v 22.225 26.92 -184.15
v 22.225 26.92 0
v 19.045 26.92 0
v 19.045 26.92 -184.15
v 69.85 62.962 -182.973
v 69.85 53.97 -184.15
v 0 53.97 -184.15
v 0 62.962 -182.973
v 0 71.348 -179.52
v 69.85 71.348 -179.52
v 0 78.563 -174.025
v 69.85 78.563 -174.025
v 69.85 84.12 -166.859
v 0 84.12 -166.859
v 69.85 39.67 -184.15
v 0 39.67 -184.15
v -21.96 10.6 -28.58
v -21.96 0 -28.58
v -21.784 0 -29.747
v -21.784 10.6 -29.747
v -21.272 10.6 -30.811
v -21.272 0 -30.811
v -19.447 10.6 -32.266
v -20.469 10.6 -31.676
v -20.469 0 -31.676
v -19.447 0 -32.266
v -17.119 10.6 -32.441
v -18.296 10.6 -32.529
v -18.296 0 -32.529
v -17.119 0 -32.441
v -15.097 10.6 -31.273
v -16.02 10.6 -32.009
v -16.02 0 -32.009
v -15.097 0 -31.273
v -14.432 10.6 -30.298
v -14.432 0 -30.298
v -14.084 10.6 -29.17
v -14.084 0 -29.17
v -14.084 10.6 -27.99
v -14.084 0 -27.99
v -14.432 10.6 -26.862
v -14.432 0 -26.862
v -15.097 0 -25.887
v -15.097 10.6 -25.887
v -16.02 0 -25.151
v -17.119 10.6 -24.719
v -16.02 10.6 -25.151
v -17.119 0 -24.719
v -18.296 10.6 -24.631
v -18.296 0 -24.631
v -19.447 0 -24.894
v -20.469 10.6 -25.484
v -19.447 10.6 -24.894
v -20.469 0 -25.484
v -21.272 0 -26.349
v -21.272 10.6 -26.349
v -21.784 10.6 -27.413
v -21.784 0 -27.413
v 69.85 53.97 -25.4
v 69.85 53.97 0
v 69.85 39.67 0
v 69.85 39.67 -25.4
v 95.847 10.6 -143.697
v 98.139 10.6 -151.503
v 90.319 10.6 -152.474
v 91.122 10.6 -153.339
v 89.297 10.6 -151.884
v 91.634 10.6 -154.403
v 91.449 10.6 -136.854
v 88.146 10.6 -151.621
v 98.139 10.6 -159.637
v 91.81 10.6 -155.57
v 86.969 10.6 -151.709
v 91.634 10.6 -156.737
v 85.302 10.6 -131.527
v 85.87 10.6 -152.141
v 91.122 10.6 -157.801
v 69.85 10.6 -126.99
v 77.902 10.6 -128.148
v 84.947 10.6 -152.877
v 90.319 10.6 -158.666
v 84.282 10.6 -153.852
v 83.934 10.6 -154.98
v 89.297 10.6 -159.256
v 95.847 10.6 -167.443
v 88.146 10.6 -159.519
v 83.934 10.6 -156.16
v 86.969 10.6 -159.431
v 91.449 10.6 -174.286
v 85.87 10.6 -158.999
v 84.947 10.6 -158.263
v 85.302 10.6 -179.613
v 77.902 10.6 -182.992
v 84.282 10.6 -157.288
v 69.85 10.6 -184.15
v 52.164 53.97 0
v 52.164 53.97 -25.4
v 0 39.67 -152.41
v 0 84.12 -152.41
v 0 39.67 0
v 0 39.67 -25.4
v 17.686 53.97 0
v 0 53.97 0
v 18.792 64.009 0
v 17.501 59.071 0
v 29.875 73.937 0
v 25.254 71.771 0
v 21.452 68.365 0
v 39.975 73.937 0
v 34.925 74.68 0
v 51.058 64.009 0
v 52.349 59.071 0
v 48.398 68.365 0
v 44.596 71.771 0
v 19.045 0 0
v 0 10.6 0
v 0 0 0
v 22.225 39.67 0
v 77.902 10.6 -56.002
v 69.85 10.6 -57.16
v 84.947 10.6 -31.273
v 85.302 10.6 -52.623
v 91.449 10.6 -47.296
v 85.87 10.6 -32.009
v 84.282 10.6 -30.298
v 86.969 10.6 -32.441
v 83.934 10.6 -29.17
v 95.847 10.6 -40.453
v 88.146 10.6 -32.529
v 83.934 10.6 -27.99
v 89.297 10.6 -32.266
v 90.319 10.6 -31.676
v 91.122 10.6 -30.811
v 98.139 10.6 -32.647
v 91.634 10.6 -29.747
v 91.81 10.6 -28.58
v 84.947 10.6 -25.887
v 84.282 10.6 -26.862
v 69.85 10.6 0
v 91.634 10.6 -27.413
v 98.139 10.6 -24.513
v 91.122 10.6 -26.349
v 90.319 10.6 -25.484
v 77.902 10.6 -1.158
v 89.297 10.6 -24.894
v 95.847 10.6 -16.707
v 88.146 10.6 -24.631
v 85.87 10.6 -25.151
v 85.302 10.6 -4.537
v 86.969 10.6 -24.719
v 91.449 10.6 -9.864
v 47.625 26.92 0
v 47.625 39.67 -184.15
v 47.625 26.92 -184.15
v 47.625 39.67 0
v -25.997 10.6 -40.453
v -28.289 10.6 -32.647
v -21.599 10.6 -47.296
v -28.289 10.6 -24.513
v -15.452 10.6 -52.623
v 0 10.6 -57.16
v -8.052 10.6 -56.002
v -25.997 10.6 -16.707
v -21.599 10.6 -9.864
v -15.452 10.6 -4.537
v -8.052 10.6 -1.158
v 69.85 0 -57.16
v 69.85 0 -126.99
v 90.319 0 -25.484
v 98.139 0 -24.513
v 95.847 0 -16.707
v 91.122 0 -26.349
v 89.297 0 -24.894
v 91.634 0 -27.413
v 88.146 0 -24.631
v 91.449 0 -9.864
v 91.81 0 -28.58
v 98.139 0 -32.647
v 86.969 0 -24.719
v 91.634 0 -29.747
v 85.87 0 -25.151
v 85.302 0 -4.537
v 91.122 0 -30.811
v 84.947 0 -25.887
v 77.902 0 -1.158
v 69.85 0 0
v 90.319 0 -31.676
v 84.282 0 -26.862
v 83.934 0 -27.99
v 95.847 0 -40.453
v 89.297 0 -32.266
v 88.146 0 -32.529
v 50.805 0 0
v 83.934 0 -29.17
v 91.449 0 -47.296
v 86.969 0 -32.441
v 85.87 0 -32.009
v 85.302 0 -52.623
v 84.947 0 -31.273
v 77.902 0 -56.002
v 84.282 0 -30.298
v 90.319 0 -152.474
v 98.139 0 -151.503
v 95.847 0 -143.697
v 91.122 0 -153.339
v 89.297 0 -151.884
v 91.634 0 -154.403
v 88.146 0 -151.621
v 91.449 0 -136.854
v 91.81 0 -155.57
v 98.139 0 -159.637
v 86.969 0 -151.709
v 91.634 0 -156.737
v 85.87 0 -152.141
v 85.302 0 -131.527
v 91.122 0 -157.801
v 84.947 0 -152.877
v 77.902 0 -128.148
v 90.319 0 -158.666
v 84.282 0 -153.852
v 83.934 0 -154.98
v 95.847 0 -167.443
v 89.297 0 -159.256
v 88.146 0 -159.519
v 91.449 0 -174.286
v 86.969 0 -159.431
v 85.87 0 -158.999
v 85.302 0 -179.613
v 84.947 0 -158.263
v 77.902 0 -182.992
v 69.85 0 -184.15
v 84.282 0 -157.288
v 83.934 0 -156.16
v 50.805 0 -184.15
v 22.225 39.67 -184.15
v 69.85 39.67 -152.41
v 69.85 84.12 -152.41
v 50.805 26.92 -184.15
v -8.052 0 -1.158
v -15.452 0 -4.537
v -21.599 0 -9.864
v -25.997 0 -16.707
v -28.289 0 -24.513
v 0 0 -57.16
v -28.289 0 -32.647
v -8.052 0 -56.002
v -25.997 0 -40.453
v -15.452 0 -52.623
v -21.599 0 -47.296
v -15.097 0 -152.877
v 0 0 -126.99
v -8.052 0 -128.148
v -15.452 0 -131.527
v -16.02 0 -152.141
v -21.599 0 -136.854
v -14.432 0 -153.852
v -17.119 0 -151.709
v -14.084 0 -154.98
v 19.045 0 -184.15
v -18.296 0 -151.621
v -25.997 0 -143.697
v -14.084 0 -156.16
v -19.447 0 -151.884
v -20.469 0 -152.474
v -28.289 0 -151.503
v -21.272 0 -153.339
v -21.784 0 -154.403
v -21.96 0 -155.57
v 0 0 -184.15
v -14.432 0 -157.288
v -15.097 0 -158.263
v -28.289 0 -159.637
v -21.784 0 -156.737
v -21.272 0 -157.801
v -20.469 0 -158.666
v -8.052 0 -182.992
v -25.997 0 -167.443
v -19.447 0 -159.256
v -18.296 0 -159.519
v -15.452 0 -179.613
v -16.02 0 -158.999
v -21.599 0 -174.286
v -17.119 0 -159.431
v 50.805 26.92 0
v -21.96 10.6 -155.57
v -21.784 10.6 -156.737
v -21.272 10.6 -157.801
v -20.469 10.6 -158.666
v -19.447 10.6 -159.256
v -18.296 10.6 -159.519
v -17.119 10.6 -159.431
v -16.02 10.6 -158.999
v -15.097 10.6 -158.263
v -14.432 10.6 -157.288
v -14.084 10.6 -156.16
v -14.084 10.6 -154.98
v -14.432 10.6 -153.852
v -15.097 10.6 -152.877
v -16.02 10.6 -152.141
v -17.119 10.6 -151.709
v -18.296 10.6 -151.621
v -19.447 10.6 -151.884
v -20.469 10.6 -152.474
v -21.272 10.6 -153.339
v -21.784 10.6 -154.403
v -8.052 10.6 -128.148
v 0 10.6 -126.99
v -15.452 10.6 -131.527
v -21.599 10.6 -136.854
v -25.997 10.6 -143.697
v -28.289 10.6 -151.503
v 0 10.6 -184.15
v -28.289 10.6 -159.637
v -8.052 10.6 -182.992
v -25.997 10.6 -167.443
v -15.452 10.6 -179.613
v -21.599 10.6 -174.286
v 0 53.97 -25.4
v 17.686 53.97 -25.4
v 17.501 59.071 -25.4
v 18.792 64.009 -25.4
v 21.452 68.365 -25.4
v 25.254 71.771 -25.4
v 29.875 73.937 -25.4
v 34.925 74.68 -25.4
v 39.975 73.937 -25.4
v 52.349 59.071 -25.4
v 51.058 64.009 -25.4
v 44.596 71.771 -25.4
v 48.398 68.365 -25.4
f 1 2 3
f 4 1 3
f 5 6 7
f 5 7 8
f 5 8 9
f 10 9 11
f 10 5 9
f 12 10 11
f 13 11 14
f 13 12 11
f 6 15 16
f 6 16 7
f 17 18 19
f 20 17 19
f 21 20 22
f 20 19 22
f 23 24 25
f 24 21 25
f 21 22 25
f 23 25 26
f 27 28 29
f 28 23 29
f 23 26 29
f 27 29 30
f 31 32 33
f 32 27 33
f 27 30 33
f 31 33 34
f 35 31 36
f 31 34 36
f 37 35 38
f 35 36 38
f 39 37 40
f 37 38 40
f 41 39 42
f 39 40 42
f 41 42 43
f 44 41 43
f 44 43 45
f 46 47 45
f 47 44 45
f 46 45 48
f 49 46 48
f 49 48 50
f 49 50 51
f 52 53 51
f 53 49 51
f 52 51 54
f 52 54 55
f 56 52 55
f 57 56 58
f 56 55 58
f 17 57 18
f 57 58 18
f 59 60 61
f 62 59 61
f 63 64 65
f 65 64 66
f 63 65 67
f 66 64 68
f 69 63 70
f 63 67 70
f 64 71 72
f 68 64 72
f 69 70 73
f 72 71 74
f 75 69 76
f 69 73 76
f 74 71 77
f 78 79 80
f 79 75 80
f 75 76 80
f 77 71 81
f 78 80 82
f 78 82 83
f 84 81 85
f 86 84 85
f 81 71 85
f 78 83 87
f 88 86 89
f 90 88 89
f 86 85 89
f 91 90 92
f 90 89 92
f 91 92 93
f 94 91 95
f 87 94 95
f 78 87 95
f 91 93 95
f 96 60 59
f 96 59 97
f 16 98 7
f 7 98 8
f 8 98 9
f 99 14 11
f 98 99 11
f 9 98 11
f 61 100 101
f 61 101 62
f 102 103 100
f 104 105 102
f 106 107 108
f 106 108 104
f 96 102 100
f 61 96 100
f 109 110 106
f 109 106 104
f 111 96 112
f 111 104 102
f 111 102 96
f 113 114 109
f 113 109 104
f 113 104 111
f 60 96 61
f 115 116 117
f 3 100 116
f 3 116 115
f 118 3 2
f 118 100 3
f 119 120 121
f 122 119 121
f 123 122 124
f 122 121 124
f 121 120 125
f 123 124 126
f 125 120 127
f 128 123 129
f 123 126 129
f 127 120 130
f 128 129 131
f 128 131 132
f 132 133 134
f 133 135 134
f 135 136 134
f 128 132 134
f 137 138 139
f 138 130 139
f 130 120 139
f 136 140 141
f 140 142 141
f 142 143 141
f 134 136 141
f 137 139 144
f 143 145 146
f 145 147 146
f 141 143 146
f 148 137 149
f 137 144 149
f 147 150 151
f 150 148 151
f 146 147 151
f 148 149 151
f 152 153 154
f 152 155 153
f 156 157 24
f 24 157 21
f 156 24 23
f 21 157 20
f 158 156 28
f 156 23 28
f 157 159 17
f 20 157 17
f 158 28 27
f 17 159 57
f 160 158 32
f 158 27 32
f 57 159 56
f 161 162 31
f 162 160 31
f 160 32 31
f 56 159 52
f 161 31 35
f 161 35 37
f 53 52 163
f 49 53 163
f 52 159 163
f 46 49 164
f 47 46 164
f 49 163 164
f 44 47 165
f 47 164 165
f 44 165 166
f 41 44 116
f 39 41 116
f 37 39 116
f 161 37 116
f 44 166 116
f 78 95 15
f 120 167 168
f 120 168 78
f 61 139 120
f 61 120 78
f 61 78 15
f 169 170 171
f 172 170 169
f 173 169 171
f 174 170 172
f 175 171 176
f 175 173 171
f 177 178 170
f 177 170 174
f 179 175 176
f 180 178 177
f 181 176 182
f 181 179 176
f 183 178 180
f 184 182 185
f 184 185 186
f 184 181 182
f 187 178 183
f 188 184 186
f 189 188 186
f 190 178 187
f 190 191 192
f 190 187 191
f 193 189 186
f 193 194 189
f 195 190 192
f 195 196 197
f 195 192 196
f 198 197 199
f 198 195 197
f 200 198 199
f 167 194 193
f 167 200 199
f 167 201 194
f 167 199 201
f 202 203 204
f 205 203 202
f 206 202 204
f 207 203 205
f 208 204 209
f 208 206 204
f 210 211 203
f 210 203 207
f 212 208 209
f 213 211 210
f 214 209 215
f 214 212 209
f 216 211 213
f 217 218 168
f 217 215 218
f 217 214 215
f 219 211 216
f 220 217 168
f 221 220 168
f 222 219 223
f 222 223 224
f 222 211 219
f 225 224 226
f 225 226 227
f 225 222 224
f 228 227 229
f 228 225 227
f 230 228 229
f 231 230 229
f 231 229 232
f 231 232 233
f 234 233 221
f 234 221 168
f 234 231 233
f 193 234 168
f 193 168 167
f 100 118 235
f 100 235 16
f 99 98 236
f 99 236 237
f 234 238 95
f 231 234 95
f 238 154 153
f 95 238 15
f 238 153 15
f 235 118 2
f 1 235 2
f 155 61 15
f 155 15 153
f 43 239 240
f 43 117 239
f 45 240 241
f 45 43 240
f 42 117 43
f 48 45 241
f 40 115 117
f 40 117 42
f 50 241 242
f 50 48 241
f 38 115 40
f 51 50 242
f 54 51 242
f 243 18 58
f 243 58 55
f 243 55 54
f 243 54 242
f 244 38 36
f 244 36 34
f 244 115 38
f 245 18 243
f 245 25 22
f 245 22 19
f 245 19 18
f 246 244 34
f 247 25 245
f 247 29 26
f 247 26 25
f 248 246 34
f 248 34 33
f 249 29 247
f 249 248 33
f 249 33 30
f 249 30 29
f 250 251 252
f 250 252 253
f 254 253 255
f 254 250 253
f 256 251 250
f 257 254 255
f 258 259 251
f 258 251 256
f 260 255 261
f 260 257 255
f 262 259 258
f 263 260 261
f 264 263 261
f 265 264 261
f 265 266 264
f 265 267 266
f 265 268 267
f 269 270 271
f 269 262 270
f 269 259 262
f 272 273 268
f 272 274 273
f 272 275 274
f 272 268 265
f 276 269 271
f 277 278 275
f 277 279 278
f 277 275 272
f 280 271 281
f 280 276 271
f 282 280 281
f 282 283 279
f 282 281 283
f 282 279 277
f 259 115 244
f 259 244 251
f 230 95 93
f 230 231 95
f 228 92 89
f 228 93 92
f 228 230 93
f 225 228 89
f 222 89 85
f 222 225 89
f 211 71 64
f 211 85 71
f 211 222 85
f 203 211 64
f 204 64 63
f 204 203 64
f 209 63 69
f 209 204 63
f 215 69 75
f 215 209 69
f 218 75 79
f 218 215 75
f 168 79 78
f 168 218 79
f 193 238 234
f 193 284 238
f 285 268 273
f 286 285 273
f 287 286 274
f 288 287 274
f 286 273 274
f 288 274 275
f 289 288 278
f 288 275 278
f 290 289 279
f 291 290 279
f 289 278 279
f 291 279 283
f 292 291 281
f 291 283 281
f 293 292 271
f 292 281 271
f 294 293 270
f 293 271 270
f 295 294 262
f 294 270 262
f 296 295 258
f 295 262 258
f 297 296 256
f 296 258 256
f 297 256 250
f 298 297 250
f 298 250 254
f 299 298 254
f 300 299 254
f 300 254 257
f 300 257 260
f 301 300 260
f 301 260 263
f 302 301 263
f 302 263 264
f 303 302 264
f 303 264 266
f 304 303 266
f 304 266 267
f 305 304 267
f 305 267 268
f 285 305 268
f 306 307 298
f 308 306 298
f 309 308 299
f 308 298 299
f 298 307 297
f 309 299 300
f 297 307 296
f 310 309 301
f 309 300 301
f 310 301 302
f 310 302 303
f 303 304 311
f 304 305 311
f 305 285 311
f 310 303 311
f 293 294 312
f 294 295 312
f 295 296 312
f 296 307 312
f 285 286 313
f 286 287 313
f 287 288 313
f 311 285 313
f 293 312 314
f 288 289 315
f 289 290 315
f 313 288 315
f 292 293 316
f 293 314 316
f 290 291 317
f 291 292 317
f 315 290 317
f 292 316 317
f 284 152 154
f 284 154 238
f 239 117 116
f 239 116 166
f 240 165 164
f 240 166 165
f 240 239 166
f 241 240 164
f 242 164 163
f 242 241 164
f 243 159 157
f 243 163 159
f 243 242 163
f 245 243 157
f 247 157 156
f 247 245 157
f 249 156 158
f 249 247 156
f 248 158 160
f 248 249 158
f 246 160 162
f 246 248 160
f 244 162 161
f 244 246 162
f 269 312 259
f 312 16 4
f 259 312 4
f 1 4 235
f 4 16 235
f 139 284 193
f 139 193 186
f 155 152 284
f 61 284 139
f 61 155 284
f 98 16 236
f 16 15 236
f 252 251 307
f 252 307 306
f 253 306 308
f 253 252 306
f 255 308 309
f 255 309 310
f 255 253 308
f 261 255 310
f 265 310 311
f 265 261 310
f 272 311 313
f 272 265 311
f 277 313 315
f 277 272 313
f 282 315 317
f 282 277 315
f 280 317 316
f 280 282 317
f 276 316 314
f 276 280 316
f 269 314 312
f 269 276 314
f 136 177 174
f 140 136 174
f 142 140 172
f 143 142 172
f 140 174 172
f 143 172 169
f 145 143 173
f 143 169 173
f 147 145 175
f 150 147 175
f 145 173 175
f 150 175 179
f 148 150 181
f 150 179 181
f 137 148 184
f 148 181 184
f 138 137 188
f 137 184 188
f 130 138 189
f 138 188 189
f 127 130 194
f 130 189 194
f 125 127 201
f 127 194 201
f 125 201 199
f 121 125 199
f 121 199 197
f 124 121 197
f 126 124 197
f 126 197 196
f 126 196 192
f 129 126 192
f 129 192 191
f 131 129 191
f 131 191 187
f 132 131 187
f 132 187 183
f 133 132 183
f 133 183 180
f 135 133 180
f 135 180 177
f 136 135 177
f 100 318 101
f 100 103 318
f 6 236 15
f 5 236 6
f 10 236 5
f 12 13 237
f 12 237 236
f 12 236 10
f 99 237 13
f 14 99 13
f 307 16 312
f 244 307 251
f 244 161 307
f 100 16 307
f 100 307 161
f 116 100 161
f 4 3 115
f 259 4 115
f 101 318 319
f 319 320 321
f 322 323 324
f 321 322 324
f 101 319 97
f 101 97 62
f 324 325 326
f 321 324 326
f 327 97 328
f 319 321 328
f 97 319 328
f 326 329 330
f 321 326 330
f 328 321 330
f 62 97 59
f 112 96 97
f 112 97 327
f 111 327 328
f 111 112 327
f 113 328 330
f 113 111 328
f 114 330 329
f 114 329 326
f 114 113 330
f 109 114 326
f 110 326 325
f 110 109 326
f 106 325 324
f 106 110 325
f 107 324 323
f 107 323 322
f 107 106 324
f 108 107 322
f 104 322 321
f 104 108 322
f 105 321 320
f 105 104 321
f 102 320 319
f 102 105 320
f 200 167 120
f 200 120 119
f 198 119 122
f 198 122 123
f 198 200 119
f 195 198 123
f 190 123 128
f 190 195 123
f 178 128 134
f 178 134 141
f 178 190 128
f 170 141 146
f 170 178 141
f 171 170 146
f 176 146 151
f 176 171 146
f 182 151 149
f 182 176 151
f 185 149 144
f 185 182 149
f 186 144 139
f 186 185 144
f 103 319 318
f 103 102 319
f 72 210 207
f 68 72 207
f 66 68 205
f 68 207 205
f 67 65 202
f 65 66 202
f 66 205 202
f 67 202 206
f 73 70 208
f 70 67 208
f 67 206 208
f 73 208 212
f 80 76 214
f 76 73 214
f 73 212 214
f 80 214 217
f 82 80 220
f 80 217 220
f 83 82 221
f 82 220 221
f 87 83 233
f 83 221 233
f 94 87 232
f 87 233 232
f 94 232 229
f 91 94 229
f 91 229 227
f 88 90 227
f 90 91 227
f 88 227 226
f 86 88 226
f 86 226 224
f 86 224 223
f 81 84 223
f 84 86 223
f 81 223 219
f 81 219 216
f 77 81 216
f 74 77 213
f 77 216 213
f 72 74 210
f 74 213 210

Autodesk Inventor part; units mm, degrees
ref_plane "YZ Plane" through (0, 0, 0) normal (1, 0, 0) x (0, 1, 0)
sketch "Sketch1" plane through (0, 0, 0) normal (0, 0, 1) x (1, 0, 0)
  line L0 (0, 0) -> (69.85, 0)
  line L1 (69.85, 0) -> (69.85, 39.67)
  line L2 (69.85, 39.67) -> (0, 39.67)
  line L3 (0, 39.67) -> (0, 0)
  dimension "d0" = 69.85
  dimension "d1" = 39.67
extrude "Extrusion1" add sketch "Sketch1" against normal blind 184.15
sketch "Sketch2" plane through (69.85, 0, 0) normal (1, 0, 0) x (0, 0, -1)
  line L0 (184.15, 39.67) -> (184.15, 0) projected
  line L1 (184.15, 39.67) -> (152.41, 39.67)
  line L2 (0, 39.67) -> (184.15, 39.67) projected
  line L3 (152.41, 39.67) -> (152.41, 84.12)
  line L4 (152.41, 39.67) -> (196.86, 39.67) construction
  line L5 (152.41, 84.12) -> (166.86, 84.12)
  arc A0 (184.15, 53.97) -> (166.8575, 84.12) centre (149.22, 53.97) ccw
  line L6 (184.15, 39.67) -> (184.15, 53.97)
  point P0 (0, 0)
  dimension "d4" = 31.74
  dimension "d5" = 44.45
  dimension "d6" = 90
  dimension "d7" = 14.45
  dimension "d8" = 90
  dimension "d9" = 69.86
  dimension "d10" = 30.15
extrude "Extrusion2" add sketch "Sketch2" against normal blind 69.85 separate body
sketch "Sketch3" plane through (0, 0, 0) normal (0, 0, 1) x (1, 0, 0)
  line L0 (69.85, 84.12) -> (0, 84.12) projected
  line L1 (0, 39.67) -> (69.85, 39.67) projected
  line L2 (0, 84.12) -> (0, 53.97) projected
  line L3 (0, 53.97) -> (0, 39.67)
  line L4 (69.85, 39.67) -> (69.85, 0) projected
  line L5 (69.85, 53.97) -> (69.85, 39.67)
  line L6 (0, 53.97) -> (0, 39.67) projected
  line L7 (0, 39.67) -> (0, 53.97)
  line L8 (69.85, 53.97) -> (0, 53.97) projected
  line L9 (69.85, 53.97) -> (69.85, 39.67)
  arc A0 (52.1642, 53.97) -> (17.6858, 53.97) centre (34.925, 57.15) ccw
  arc A1 (33.6019, 39.67) -> (36.2481, 39.67) centre (34.925, 57.15) ccw
  line L10 (0, 53.97) -> (17.6858, 53.97)
  line L11 (52.1642, 53.97) -> (69.85, 53.97)
  point P0 (0, 0)
  point P1 (17.6858, 53.97)
  dimension "d14" = 17.48
extrude "Extrusion3" add sketch "Sketch3" against normal blind 25.4 separate body contours L3 L8 L5 L1 | A0 L8
sketch "Sketch4" plane through (0, 0, 0) normal (0, 0, 1) x (1, 0, 0)
  line L0 (22.225, 42.93) -> (47.625, 42.93)
  line L1 (0, 0) -> (69.85, 0) projected
  line L2 (22.225, 42.93) -> (22.225, 26.92)
  line L3 (22.225, 26.92) -> (19.045, 26.92)
  line L4 (19.045, 26.92) -> (19.045, 0)
  line L5 (34.925, 0) -> (34.925, 13.46)
  line L6 (47.625, 42.93) -> (47.625, 26.92)
  line L7 (47.625, 26.92) -> (50.805, 26.92)
  line L8 (50.805, 26.92) -> (50.805, 0)
  line L9 (19.045, 0) -> (19.045, -11.3598)
  line L10 (19.045, -11.3598) -> (50.805, -11.3598)
  line L11 (50.805, -11.3598) -> (50.805, 0)
  point P0 (34.925, 42.93)
  dimension "d17" = 25.4
  dimension "d18" = 16.01
  dimension "d19" = 3.18
  dimension "d20" = 26.92
extrude "Extrusion4" cut sketch "Sketch4" against normal blind 319.9 contours L0 L6 L7 L8 L1 L4 L3 L2 bodies 1
sketch "Sketch5" plane through (69.85, 0, -184.15) normal (0, -1, 0) x (1, 0, 0)
  line L0 (0, 184.15) -> (-17.6858, 184.15) projected
  line L1 (0, 184.15) -> (0, 155.57)
  line L2 (0, 184.15) -> (0, 158.75) projected
  arc A0 (0, 126.99) -> (0, 184.15) centre (0, 155.57) ccw
  circle A1 centre (18, 155.57) radius 3.96
  line L3 (0, 184.15) -> (0, 126.99)
  point P0 (-69.85, 184.15)
extrude "Extrusion5" add sketch "Sketch5" against normal blind 10.6 bodies 1
ref_plane "Work Plane1" through (34.925, 0, -184.15) normal (1, 0, 0) x (0, 0, -1)
ref_plane "Work Plane2" through (0, 0, -92.075) normal (0, 0, -1) x (-1, 0, 0)
mirror "Mirror2" about plane through (0, 0, -92.075) normal (0, 0, -1) of "Extrusion5" bodies 1
mirror "Mirror3" about plane through (34.925, 0, -184.15) normal (1, 0, 0) of "Extrusion5", "Mirror2" bodies 1
properties part number "yeni_mengene_ho"
